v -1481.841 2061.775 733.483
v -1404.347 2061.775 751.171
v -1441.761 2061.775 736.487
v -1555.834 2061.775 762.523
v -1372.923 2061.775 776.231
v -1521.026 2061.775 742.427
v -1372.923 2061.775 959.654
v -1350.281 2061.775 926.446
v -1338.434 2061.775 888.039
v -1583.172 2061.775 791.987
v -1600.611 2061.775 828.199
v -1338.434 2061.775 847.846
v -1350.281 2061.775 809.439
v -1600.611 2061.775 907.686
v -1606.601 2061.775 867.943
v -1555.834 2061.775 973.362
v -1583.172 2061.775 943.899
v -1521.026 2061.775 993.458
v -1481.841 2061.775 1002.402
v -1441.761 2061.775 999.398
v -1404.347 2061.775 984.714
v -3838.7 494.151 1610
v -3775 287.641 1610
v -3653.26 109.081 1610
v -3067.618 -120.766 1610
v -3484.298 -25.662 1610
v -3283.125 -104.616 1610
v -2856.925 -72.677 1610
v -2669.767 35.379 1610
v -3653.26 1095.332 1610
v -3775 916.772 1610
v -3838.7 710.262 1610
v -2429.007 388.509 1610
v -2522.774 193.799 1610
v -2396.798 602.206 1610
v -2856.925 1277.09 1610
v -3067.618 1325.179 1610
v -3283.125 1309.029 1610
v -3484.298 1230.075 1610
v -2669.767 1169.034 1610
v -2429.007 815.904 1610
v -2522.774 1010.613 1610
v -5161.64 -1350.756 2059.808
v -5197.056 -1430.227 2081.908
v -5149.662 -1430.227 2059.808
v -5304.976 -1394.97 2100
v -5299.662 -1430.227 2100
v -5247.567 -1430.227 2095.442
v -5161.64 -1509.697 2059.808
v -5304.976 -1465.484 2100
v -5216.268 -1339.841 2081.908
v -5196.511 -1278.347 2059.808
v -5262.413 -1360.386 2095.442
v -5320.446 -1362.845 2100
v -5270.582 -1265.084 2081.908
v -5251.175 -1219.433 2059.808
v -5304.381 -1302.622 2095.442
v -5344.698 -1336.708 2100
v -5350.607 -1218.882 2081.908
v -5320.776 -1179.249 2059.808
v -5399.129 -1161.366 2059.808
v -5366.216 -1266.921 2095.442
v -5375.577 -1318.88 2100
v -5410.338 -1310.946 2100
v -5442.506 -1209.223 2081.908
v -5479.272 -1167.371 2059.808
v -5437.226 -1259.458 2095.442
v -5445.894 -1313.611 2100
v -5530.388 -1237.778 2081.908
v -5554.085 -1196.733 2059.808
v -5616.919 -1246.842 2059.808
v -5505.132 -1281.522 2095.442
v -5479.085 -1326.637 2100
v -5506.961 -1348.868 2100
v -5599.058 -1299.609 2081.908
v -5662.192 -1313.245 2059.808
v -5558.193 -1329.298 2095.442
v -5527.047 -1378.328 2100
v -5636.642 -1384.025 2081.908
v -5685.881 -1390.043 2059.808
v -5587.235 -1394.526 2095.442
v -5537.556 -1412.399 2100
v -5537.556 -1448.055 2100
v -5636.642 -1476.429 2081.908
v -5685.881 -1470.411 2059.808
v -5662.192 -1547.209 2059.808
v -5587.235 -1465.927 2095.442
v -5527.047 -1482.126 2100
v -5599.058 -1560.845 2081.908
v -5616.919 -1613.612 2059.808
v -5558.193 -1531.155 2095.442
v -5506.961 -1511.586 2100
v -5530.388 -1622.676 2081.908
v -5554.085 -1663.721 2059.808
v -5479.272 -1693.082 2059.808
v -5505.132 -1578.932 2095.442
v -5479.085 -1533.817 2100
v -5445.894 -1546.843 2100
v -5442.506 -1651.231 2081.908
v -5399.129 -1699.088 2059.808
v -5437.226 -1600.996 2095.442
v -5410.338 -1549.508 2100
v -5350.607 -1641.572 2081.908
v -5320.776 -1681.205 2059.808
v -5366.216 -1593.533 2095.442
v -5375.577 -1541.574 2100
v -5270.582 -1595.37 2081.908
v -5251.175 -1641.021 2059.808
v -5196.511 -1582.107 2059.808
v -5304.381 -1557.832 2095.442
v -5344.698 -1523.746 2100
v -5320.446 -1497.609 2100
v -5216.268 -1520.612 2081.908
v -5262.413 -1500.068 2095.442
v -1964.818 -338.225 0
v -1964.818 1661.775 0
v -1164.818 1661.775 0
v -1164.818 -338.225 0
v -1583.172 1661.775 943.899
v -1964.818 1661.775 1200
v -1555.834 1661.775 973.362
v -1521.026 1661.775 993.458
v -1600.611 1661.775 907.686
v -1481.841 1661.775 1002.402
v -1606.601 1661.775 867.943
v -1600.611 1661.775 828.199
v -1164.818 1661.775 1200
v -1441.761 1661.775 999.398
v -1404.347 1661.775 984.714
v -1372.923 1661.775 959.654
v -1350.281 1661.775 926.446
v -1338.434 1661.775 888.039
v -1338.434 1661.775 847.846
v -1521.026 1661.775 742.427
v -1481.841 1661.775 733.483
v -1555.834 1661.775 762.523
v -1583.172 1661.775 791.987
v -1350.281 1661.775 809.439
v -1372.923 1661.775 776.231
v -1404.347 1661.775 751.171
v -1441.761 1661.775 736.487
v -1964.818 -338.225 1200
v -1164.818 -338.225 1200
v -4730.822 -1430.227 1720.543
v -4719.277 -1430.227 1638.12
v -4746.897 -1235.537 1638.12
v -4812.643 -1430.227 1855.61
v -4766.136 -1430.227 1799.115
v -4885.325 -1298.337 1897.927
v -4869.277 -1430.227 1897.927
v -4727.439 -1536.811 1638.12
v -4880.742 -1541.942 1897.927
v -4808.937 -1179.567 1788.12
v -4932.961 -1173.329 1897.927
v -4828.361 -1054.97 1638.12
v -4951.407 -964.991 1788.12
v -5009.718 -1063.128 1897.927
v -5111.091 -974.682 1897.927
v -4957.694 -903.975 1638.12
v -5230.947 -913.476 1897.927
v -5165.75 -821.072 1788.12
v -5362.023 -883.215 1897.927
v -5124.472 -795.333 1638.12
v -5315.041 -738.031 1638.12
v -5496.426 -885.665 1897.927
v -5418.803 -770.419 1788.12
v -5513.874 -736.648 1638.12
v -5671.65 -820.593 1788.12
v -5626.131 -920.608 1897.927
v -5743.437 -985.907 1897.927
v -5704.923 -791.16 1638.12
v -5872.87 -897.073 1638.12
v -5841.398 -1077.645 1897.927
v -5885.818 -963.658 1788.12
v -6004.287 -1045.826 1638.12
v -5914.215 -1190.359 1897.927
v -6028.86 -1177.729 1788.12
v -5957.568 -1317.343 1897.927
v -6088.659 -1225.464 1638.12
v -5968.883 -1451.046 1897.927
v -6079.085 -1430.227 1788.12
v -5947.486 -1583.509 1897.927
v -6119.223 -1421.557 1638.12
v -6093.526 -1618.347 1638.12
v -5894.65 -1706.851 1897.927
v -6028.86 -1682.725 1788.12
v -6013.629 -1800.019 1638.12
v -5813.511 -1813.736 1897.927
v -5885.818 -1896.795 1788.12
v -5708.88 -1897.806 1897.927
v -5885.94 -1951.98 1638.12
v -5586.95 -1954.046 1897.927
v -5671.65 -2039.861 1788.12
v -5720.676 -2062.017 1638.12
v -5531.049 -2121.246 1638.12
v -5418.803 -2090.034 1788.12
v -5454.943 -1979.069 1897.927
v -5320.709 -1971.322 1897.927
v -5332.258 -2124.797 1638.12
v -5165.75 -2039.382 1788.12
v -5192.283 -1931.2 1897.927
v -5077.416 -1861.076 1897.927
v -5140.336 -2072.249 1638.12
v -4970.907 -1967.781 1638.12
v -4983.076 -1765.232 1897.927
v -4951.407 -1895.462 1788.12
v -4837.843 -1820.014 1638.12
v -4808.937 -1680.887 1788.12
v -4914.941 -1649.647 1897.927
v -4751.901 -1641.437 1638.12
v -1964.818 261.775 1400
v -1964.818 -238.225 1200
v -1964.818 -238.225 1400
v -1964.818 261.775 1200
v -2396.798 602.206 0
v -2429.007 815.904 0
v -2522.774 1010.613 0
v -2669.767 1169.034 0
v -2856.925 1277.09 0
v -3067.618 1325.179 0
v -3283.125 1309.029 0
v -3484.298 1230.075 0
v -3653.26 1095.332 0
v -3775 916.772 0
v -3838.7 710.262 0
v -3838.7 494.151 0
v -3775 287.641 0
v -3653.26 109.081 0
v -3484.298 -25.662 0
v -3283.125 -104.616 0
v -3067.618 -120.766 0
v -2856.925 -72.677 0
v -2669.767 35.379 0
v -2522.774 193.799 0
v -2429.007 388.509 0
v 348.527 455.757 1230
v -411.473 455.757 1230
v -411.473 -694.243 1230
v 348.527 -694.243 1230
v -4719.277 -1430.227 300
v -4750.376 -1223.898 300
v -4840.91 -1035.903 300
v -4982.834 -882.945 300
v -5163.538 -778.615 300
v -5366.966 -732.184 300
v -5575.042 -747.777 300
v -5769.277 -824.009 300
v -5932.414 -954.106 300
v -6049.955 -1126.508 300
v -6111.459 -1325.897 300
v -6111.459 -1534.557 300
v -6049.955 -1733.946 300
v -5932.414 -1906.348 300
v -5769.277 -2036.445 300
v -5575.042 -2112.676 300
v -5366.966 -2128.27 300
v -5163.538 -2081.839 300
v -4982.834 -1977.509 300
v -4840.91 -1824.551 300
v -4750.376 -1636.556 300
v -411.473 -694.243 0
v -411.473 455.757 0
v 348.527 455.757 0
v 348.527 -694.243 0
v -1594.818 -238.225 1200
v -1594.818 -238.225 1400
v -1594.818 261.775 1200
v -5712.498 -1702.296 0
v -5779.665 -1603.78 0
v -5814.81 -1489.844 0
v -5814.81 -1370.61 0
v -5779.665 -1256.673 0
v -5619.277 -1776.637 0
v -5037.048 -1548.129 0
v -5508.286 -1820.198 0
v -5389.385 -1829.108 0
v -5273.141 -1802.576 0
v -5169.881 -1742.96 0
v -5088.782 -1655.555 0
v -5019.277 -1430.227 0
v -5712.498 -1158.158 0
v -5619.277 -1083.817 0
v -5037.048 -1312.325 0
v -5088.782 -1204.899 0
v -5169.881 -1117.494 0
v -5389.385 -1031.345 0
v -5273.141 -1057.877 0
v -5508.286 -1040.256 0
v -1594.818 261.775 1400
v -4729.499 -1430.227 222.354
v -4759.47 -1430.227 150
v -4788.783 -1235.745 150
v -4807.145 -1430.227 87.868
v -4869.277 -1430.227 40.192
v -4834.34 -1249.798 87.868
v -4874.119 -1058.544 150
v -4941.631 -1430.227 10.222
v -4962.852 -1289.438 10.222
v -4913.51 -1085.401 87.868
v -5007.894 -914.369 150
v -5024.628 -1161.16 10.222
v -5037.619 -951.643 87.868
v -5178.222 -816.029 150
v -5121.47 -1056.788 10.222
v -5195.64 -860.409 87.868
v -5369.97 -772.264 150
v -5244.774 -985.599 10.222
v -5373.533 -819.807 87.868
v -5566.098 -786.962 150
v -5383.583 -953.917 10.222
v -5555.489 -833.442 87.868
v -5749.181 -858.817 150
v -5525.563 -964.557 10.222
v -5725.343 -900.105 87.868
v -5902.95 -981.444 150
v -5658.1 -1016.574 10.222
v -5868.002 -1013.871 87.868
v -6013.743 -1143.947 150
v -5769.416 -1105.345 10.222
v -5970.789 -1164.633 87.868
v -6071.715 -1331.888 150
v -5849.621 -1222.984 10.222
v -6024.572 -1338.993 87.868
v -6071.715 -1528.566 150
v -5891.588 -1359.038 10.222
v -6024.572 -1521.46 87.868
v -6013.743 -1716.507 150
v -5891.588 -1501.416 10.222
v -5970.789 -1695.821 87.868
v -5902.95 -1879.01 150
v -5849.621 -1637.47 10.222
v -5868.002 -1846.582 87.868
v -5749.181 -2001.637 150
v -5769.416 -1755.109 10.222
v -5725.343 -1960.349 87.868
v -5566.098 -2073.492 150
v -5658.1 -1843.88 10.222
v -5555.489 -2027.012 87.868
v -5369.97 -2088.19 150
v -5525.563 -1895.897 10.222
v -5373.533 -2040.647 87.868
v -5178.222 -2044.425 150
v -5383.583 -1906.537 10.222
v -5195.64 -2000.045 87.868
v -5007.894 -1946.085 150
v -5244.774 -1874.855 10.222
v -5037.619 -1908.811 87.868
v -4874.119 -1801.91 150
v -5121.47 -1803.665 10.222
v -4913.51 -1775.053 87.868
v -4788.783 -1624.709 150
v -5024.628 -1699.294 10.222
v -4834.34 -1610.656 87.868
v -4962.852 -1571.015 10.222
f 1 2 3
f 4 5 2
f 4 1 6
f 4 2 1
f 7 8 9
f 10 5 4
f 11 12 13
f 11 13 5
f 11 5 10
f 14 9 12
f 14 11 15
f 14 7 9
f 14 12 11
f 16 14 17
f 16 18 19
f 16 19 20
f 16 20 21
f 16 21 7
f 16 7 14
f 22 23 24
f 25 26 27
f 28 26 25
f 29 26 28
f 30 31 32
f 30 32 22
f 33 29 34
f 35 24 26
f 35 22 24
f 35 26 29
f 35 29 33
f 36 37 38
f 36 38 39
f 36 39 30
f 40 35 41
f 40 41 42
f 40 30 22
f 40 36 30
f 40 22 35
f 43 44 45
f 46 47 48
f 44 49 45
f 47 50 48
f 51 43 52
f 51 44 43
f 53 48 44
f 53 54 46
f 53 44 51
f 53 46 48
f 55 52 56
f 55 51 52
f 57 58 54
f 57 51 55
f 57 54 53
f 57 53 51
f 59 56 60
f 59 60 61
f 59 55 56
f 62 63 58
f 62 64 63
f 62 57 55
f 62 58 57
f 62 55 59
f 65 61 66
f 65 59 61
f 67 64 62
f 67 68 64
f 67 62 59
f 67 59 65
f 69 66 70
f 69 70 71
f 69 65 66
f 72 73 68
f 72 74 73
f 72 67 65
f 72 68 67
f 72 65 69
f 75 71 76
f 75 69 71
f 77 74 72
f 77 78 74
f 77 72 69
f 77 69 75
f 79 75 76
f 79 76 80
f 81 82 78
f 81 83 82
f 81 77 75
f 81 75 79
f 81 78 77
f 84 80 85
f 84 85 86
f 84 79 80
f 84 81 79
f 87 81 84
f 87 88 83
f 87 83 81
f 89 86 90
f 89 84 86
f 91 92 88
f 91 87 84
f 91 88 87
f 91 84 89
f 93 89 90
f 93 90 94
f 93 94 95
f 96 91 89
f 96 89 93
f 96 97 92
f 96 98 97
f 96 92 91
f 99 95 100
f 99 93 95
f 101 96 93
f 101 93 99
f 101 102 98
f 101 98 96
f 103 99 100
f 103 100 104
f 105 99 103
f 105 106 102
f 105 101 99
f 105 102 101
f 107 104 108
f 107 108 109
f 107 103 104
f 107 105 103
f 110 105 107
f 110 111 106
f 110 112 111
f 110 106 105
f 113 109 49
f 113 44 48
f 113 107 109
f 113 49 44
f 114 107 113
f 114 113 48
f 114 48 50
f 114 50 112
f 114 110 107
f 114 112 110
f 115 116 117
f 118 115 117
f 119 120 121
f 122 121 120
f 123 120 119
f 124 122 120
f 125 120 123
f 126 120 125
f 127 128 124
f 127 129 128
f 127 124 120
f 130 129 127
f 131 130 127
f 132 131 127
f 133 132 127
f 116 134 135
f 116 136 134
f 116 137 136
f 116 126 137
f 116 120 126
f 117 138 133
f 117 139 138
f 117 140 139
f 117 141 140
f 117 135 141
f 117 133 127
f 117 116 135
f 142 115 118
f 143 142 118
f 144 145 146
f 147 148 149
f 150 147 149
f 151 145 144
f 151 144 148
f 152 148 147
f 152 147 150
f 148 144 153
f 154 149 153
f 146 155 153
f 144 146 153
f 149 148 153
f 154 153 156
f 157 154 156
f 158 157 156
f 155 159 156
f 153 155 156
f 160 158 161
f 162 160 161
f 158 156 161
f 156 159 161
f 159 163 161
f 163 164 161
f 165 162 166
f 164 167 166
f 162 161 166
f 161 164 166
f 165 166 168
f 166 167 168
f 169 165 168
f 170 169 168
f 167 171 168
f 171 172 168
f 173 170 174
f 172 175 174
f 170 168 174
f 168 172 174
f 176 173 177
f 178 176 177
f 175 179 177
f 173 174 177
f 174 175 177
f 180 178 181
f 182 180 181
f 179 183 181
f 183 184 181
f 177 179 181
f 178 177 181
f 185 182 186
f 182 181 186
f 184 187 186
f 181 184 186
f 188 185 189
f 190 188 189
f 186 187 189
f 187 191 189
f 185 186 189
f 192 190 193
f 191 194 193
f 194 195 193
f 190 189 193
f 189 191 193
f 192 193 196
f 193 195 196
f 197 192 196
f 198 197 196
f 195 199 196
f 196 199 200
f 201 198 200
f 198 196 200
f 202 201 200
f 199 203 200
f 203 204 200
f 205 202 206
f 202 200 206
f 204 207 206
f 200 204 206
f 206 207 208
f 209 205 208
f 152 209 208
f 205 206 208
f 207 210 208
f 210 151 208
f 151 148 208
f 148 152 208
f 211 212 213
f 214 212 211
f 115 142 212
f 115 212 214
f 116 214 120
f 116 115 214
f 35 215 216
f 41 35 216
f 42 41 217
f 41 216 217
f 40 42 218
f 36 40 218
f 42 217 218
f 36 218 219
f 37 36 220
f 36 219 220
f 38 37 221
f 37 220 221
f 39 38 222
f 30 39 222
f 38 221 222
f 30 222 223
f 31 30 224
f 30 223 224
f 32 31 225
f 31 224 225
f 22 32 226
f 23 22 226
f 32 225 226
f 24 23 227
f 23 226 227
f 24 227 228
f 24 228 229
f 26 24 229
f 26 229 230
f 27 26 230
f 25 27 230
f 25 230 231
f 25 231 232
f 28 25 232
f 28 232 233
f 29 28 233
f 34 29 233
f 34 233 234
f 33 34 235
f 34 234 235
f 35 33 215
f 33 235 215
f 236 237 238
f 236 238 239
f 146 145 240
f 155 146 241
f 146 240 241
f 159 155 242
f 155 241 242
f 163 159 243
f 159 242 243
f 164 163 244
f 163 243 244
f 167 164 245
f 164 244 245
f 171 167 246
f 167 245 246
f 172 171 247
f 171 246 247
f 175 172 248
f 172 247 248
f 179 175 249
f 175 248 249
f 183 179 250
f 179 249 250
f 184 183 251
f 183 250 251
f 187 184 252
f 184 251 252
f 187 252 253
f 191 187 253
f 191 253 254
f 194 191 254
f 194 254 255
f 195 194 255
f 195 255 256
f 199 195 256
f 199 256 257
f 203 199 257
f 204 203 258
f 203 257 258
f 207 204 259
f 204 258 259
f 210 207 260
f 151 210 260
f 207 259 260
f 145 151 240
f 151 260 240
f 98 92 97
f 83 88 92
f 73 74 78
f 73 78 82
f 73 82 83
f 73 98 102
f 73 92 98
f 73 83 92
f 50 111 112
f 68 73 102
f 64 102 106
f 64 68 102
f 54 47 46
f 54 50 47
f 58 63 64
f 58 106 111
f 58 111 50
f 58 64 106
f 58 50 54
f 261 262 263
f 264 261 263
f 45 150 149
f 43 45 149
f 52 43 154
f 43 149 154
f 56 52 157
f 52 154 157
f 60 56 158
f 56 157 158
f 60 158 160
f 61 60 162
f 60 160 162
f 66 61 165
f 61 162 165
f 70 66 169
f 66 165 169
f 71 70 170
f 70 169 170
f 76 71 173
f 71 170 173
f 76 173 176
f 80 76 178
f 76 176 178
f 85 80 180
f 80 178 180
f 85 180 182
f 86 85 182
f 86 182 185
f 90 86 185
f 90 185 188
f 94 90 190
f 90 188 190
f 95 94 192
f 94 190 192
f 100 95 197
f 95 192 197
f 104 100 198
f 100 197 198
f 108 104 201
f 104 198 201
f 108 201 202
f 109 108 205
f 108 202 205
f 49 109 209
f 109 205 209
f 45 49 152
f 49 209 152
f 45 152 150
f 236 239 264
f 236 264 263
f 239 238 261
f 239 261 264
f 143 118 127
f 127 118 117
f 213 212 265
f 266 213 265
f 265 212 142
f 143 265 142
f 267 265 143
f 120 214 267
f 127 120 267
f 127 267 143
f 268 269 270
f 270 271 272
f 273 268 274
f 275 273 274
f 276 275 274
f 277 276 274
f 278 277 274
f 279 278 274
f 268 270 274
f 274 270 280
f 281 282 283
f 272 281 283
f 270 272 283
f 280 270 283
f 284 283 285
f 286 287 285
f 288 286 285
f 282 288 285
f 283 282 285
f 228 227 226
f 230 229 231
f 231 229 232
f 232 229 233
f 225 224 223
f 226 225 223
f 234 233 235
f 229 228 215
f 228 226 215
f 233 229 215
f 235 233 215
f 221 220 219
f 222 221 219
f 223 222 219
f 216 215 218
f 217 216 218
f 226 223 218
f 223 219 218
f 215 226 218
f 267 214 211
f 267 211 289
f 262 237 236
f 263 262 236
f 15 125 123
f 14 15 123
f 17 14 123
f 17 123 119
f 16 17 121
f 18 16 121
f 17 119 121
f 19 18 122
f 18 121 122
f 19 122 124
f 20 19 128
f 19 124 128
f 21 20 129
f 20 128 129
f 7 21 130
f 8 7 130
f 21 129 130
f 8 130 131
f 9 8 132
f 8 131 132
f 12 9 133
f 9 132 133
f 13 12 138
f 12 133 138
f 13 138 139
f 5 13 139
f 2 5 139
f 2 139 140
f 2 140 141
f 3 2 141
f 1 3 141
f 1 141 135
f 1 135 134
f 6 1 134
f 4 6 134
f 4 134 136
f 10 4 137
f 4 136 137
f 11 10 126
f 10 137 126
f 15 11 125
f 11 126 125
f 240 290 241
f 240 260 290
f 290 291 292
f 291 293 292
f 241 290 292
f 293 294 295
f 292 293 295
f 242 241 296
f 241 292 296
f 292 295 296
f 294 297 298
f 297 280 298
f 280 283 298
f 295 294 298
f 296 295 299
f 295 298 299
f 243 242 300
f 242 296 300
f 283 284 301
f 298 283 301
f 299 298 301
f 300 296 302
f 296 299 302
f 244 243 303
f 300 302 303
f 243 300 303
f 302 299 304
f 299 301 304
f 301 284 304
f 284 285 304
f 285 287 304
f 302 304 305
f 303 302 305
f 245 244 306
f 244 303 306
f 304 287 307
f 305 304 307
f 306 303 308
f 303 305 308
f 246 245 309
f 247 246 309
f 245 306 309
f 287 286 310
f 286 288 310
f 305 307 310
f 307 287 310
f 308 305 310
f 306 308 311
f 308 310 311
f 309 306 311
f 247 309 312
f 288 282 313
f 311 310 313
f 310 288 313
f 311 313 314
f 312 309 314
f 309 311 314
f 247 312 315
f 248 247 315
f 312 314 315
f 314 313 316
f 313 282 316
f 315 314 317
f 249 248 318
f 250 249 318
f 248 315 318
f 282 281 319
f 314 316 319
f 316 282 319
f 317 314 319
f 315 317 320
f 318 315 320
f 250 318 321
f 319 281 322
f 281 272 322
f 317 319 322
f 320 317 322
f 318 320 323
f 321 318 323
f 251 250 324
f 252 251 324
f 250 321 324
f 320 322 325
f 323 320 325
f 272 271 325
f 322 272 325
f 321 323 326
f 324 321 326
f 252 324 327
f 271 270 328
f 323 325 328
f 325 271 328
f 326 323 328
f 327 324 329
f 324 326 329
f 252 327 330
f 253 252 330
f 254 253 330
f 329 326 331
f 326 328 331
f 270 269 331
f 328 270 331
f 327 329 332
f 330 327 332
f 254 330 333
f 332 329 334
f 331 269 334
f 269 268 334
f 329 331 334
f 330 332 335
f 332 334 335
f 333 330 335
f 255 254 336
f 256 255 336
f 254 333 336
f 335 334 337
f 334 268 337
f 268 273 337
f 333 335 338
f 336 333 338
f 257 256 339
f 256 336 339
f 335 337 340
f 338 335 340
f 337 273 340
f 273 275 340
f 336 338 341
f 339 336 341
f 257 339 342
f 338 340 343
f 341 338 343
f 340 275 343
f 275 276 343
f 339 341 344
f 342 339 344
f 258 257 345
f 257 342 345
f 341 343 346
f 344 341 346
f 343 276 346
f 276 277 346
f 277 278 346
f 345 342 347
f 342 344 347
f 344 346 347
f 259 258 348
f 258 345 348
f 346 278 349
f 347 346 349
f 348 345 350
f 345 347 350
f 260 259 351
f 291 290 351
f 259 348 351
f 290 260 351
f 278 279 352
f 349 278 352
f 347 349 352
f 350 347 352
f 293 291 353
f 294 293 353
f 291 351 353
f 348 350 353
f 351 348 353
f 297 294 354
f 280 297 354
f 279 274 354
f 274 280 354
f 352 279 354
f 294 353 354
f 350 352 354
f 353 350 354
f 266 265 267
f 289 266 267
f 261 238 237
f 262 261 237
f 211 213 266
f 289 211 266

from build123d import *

# Parameters (mm, degrees)
F0_W      = 760
F0_H      = 1150
F1_DEPTH  = 1230
F2_R      = 725
F3_DEPTH  = 1610
F4_W      = 800
F4_H      = 2000
F5_DEPTH  = 1200
F6_W      = 370
F6_H      = 500
F7_DEPTH  = 200
F8_R      = 700
F9_DEPTH  = 2100
F10_R     = 300
F11_SIZE2 = 288.6751345948
F11_SIZE  = 500
F12_R     = 300
F13_R     = 134.8362131301
F14_DEPTH = 400


with BuildPart() as f1:
    # F0 (on Top) → F1 (new body)
    with BuildSketch(Plane.XY):
        with Locations((-31.4733404666, -119.2426998605)):
            Rectangle(F0_W, F0_H)
    extrude(amount=F1_DEPTH)


with BuildPart() as f3:
    # F2 (on Top) → F3 (new body)
    with BuildSketch(Plane.XY):
        with Locations((-3121.7975616455, 602.2063493729)):
            Circle(F2_R)
    extrude(amount=F3_DEPTH)


with BuildPart() as f5:
    # F4 (on Top) → F5 (new body)
    with BuildSketch(Plane.XY):
        with Locations((-1564.8182034492, 661.7751377383)):
            Rectangle(F4_W, F4_H)
    extrude(amount=F5_DEPTH)

    # F6 (on face) → F7 (join)
    with BuildSketch(Plane.XY.offset(1200)):
        with Locations((-1779.8182034492, 11.7751377383)):
            Rectangle(F6_W, F6_H)
    extrude(amount=F7_DEPTH)

    # F13 (on face) → F14 (join)
    with BuildSketch(Plane(origin=(0, 1661.7751377383, 0), x_dir=(-1, 0, 0), z_dir=(0, 1, 0))):
        with Locations((1471.7646837234, 867.94257164)):
            Circle(F13_R)
    extrude(amount=F14_DEPTH)


with BuildPart() as f9:
    # F8 (on Top) → F9 (new body)
    with BuildSketch(Plane.XY):
        with Locations((-5419.2771911621, -1430.2269220352)):
            Circle(F8_R)
    extrude(amount=F9_DEPTH)

    # F10
    f10_edges = [f9.edges().sort_by_distance(p)[0] for p in [
        (-6119.277191, -1430.226922, 0),
    ]]
    fillet(f10_edges, radius=F10_R)

    # F11
    f11_edges = [f9.edges().sort_by_distance(p)[0] for p in [
        (-6119.277191, -1430.226922, 2100),
    ]]
    f11_side = f9.faces().sort_by_distance((-5419.277191, -1430.226922, 2100))[0]
    chamfer(f11_edges, length=F11_SIZE, length2=F11_SIZE2, reference=f11_side)

    # F12
    f12_edges = [f9.edges().sort_by_distance(p)[0] for p in [
        (-6119.277191, -1430.226922, 1811.324865),
        (-5619.277191, -1430.226922, 2100),
    ]]
    fillet(f12_edges, radius=F12_R)


solid = Compound([f1.part, f3.part, f5.part, f9.part])
